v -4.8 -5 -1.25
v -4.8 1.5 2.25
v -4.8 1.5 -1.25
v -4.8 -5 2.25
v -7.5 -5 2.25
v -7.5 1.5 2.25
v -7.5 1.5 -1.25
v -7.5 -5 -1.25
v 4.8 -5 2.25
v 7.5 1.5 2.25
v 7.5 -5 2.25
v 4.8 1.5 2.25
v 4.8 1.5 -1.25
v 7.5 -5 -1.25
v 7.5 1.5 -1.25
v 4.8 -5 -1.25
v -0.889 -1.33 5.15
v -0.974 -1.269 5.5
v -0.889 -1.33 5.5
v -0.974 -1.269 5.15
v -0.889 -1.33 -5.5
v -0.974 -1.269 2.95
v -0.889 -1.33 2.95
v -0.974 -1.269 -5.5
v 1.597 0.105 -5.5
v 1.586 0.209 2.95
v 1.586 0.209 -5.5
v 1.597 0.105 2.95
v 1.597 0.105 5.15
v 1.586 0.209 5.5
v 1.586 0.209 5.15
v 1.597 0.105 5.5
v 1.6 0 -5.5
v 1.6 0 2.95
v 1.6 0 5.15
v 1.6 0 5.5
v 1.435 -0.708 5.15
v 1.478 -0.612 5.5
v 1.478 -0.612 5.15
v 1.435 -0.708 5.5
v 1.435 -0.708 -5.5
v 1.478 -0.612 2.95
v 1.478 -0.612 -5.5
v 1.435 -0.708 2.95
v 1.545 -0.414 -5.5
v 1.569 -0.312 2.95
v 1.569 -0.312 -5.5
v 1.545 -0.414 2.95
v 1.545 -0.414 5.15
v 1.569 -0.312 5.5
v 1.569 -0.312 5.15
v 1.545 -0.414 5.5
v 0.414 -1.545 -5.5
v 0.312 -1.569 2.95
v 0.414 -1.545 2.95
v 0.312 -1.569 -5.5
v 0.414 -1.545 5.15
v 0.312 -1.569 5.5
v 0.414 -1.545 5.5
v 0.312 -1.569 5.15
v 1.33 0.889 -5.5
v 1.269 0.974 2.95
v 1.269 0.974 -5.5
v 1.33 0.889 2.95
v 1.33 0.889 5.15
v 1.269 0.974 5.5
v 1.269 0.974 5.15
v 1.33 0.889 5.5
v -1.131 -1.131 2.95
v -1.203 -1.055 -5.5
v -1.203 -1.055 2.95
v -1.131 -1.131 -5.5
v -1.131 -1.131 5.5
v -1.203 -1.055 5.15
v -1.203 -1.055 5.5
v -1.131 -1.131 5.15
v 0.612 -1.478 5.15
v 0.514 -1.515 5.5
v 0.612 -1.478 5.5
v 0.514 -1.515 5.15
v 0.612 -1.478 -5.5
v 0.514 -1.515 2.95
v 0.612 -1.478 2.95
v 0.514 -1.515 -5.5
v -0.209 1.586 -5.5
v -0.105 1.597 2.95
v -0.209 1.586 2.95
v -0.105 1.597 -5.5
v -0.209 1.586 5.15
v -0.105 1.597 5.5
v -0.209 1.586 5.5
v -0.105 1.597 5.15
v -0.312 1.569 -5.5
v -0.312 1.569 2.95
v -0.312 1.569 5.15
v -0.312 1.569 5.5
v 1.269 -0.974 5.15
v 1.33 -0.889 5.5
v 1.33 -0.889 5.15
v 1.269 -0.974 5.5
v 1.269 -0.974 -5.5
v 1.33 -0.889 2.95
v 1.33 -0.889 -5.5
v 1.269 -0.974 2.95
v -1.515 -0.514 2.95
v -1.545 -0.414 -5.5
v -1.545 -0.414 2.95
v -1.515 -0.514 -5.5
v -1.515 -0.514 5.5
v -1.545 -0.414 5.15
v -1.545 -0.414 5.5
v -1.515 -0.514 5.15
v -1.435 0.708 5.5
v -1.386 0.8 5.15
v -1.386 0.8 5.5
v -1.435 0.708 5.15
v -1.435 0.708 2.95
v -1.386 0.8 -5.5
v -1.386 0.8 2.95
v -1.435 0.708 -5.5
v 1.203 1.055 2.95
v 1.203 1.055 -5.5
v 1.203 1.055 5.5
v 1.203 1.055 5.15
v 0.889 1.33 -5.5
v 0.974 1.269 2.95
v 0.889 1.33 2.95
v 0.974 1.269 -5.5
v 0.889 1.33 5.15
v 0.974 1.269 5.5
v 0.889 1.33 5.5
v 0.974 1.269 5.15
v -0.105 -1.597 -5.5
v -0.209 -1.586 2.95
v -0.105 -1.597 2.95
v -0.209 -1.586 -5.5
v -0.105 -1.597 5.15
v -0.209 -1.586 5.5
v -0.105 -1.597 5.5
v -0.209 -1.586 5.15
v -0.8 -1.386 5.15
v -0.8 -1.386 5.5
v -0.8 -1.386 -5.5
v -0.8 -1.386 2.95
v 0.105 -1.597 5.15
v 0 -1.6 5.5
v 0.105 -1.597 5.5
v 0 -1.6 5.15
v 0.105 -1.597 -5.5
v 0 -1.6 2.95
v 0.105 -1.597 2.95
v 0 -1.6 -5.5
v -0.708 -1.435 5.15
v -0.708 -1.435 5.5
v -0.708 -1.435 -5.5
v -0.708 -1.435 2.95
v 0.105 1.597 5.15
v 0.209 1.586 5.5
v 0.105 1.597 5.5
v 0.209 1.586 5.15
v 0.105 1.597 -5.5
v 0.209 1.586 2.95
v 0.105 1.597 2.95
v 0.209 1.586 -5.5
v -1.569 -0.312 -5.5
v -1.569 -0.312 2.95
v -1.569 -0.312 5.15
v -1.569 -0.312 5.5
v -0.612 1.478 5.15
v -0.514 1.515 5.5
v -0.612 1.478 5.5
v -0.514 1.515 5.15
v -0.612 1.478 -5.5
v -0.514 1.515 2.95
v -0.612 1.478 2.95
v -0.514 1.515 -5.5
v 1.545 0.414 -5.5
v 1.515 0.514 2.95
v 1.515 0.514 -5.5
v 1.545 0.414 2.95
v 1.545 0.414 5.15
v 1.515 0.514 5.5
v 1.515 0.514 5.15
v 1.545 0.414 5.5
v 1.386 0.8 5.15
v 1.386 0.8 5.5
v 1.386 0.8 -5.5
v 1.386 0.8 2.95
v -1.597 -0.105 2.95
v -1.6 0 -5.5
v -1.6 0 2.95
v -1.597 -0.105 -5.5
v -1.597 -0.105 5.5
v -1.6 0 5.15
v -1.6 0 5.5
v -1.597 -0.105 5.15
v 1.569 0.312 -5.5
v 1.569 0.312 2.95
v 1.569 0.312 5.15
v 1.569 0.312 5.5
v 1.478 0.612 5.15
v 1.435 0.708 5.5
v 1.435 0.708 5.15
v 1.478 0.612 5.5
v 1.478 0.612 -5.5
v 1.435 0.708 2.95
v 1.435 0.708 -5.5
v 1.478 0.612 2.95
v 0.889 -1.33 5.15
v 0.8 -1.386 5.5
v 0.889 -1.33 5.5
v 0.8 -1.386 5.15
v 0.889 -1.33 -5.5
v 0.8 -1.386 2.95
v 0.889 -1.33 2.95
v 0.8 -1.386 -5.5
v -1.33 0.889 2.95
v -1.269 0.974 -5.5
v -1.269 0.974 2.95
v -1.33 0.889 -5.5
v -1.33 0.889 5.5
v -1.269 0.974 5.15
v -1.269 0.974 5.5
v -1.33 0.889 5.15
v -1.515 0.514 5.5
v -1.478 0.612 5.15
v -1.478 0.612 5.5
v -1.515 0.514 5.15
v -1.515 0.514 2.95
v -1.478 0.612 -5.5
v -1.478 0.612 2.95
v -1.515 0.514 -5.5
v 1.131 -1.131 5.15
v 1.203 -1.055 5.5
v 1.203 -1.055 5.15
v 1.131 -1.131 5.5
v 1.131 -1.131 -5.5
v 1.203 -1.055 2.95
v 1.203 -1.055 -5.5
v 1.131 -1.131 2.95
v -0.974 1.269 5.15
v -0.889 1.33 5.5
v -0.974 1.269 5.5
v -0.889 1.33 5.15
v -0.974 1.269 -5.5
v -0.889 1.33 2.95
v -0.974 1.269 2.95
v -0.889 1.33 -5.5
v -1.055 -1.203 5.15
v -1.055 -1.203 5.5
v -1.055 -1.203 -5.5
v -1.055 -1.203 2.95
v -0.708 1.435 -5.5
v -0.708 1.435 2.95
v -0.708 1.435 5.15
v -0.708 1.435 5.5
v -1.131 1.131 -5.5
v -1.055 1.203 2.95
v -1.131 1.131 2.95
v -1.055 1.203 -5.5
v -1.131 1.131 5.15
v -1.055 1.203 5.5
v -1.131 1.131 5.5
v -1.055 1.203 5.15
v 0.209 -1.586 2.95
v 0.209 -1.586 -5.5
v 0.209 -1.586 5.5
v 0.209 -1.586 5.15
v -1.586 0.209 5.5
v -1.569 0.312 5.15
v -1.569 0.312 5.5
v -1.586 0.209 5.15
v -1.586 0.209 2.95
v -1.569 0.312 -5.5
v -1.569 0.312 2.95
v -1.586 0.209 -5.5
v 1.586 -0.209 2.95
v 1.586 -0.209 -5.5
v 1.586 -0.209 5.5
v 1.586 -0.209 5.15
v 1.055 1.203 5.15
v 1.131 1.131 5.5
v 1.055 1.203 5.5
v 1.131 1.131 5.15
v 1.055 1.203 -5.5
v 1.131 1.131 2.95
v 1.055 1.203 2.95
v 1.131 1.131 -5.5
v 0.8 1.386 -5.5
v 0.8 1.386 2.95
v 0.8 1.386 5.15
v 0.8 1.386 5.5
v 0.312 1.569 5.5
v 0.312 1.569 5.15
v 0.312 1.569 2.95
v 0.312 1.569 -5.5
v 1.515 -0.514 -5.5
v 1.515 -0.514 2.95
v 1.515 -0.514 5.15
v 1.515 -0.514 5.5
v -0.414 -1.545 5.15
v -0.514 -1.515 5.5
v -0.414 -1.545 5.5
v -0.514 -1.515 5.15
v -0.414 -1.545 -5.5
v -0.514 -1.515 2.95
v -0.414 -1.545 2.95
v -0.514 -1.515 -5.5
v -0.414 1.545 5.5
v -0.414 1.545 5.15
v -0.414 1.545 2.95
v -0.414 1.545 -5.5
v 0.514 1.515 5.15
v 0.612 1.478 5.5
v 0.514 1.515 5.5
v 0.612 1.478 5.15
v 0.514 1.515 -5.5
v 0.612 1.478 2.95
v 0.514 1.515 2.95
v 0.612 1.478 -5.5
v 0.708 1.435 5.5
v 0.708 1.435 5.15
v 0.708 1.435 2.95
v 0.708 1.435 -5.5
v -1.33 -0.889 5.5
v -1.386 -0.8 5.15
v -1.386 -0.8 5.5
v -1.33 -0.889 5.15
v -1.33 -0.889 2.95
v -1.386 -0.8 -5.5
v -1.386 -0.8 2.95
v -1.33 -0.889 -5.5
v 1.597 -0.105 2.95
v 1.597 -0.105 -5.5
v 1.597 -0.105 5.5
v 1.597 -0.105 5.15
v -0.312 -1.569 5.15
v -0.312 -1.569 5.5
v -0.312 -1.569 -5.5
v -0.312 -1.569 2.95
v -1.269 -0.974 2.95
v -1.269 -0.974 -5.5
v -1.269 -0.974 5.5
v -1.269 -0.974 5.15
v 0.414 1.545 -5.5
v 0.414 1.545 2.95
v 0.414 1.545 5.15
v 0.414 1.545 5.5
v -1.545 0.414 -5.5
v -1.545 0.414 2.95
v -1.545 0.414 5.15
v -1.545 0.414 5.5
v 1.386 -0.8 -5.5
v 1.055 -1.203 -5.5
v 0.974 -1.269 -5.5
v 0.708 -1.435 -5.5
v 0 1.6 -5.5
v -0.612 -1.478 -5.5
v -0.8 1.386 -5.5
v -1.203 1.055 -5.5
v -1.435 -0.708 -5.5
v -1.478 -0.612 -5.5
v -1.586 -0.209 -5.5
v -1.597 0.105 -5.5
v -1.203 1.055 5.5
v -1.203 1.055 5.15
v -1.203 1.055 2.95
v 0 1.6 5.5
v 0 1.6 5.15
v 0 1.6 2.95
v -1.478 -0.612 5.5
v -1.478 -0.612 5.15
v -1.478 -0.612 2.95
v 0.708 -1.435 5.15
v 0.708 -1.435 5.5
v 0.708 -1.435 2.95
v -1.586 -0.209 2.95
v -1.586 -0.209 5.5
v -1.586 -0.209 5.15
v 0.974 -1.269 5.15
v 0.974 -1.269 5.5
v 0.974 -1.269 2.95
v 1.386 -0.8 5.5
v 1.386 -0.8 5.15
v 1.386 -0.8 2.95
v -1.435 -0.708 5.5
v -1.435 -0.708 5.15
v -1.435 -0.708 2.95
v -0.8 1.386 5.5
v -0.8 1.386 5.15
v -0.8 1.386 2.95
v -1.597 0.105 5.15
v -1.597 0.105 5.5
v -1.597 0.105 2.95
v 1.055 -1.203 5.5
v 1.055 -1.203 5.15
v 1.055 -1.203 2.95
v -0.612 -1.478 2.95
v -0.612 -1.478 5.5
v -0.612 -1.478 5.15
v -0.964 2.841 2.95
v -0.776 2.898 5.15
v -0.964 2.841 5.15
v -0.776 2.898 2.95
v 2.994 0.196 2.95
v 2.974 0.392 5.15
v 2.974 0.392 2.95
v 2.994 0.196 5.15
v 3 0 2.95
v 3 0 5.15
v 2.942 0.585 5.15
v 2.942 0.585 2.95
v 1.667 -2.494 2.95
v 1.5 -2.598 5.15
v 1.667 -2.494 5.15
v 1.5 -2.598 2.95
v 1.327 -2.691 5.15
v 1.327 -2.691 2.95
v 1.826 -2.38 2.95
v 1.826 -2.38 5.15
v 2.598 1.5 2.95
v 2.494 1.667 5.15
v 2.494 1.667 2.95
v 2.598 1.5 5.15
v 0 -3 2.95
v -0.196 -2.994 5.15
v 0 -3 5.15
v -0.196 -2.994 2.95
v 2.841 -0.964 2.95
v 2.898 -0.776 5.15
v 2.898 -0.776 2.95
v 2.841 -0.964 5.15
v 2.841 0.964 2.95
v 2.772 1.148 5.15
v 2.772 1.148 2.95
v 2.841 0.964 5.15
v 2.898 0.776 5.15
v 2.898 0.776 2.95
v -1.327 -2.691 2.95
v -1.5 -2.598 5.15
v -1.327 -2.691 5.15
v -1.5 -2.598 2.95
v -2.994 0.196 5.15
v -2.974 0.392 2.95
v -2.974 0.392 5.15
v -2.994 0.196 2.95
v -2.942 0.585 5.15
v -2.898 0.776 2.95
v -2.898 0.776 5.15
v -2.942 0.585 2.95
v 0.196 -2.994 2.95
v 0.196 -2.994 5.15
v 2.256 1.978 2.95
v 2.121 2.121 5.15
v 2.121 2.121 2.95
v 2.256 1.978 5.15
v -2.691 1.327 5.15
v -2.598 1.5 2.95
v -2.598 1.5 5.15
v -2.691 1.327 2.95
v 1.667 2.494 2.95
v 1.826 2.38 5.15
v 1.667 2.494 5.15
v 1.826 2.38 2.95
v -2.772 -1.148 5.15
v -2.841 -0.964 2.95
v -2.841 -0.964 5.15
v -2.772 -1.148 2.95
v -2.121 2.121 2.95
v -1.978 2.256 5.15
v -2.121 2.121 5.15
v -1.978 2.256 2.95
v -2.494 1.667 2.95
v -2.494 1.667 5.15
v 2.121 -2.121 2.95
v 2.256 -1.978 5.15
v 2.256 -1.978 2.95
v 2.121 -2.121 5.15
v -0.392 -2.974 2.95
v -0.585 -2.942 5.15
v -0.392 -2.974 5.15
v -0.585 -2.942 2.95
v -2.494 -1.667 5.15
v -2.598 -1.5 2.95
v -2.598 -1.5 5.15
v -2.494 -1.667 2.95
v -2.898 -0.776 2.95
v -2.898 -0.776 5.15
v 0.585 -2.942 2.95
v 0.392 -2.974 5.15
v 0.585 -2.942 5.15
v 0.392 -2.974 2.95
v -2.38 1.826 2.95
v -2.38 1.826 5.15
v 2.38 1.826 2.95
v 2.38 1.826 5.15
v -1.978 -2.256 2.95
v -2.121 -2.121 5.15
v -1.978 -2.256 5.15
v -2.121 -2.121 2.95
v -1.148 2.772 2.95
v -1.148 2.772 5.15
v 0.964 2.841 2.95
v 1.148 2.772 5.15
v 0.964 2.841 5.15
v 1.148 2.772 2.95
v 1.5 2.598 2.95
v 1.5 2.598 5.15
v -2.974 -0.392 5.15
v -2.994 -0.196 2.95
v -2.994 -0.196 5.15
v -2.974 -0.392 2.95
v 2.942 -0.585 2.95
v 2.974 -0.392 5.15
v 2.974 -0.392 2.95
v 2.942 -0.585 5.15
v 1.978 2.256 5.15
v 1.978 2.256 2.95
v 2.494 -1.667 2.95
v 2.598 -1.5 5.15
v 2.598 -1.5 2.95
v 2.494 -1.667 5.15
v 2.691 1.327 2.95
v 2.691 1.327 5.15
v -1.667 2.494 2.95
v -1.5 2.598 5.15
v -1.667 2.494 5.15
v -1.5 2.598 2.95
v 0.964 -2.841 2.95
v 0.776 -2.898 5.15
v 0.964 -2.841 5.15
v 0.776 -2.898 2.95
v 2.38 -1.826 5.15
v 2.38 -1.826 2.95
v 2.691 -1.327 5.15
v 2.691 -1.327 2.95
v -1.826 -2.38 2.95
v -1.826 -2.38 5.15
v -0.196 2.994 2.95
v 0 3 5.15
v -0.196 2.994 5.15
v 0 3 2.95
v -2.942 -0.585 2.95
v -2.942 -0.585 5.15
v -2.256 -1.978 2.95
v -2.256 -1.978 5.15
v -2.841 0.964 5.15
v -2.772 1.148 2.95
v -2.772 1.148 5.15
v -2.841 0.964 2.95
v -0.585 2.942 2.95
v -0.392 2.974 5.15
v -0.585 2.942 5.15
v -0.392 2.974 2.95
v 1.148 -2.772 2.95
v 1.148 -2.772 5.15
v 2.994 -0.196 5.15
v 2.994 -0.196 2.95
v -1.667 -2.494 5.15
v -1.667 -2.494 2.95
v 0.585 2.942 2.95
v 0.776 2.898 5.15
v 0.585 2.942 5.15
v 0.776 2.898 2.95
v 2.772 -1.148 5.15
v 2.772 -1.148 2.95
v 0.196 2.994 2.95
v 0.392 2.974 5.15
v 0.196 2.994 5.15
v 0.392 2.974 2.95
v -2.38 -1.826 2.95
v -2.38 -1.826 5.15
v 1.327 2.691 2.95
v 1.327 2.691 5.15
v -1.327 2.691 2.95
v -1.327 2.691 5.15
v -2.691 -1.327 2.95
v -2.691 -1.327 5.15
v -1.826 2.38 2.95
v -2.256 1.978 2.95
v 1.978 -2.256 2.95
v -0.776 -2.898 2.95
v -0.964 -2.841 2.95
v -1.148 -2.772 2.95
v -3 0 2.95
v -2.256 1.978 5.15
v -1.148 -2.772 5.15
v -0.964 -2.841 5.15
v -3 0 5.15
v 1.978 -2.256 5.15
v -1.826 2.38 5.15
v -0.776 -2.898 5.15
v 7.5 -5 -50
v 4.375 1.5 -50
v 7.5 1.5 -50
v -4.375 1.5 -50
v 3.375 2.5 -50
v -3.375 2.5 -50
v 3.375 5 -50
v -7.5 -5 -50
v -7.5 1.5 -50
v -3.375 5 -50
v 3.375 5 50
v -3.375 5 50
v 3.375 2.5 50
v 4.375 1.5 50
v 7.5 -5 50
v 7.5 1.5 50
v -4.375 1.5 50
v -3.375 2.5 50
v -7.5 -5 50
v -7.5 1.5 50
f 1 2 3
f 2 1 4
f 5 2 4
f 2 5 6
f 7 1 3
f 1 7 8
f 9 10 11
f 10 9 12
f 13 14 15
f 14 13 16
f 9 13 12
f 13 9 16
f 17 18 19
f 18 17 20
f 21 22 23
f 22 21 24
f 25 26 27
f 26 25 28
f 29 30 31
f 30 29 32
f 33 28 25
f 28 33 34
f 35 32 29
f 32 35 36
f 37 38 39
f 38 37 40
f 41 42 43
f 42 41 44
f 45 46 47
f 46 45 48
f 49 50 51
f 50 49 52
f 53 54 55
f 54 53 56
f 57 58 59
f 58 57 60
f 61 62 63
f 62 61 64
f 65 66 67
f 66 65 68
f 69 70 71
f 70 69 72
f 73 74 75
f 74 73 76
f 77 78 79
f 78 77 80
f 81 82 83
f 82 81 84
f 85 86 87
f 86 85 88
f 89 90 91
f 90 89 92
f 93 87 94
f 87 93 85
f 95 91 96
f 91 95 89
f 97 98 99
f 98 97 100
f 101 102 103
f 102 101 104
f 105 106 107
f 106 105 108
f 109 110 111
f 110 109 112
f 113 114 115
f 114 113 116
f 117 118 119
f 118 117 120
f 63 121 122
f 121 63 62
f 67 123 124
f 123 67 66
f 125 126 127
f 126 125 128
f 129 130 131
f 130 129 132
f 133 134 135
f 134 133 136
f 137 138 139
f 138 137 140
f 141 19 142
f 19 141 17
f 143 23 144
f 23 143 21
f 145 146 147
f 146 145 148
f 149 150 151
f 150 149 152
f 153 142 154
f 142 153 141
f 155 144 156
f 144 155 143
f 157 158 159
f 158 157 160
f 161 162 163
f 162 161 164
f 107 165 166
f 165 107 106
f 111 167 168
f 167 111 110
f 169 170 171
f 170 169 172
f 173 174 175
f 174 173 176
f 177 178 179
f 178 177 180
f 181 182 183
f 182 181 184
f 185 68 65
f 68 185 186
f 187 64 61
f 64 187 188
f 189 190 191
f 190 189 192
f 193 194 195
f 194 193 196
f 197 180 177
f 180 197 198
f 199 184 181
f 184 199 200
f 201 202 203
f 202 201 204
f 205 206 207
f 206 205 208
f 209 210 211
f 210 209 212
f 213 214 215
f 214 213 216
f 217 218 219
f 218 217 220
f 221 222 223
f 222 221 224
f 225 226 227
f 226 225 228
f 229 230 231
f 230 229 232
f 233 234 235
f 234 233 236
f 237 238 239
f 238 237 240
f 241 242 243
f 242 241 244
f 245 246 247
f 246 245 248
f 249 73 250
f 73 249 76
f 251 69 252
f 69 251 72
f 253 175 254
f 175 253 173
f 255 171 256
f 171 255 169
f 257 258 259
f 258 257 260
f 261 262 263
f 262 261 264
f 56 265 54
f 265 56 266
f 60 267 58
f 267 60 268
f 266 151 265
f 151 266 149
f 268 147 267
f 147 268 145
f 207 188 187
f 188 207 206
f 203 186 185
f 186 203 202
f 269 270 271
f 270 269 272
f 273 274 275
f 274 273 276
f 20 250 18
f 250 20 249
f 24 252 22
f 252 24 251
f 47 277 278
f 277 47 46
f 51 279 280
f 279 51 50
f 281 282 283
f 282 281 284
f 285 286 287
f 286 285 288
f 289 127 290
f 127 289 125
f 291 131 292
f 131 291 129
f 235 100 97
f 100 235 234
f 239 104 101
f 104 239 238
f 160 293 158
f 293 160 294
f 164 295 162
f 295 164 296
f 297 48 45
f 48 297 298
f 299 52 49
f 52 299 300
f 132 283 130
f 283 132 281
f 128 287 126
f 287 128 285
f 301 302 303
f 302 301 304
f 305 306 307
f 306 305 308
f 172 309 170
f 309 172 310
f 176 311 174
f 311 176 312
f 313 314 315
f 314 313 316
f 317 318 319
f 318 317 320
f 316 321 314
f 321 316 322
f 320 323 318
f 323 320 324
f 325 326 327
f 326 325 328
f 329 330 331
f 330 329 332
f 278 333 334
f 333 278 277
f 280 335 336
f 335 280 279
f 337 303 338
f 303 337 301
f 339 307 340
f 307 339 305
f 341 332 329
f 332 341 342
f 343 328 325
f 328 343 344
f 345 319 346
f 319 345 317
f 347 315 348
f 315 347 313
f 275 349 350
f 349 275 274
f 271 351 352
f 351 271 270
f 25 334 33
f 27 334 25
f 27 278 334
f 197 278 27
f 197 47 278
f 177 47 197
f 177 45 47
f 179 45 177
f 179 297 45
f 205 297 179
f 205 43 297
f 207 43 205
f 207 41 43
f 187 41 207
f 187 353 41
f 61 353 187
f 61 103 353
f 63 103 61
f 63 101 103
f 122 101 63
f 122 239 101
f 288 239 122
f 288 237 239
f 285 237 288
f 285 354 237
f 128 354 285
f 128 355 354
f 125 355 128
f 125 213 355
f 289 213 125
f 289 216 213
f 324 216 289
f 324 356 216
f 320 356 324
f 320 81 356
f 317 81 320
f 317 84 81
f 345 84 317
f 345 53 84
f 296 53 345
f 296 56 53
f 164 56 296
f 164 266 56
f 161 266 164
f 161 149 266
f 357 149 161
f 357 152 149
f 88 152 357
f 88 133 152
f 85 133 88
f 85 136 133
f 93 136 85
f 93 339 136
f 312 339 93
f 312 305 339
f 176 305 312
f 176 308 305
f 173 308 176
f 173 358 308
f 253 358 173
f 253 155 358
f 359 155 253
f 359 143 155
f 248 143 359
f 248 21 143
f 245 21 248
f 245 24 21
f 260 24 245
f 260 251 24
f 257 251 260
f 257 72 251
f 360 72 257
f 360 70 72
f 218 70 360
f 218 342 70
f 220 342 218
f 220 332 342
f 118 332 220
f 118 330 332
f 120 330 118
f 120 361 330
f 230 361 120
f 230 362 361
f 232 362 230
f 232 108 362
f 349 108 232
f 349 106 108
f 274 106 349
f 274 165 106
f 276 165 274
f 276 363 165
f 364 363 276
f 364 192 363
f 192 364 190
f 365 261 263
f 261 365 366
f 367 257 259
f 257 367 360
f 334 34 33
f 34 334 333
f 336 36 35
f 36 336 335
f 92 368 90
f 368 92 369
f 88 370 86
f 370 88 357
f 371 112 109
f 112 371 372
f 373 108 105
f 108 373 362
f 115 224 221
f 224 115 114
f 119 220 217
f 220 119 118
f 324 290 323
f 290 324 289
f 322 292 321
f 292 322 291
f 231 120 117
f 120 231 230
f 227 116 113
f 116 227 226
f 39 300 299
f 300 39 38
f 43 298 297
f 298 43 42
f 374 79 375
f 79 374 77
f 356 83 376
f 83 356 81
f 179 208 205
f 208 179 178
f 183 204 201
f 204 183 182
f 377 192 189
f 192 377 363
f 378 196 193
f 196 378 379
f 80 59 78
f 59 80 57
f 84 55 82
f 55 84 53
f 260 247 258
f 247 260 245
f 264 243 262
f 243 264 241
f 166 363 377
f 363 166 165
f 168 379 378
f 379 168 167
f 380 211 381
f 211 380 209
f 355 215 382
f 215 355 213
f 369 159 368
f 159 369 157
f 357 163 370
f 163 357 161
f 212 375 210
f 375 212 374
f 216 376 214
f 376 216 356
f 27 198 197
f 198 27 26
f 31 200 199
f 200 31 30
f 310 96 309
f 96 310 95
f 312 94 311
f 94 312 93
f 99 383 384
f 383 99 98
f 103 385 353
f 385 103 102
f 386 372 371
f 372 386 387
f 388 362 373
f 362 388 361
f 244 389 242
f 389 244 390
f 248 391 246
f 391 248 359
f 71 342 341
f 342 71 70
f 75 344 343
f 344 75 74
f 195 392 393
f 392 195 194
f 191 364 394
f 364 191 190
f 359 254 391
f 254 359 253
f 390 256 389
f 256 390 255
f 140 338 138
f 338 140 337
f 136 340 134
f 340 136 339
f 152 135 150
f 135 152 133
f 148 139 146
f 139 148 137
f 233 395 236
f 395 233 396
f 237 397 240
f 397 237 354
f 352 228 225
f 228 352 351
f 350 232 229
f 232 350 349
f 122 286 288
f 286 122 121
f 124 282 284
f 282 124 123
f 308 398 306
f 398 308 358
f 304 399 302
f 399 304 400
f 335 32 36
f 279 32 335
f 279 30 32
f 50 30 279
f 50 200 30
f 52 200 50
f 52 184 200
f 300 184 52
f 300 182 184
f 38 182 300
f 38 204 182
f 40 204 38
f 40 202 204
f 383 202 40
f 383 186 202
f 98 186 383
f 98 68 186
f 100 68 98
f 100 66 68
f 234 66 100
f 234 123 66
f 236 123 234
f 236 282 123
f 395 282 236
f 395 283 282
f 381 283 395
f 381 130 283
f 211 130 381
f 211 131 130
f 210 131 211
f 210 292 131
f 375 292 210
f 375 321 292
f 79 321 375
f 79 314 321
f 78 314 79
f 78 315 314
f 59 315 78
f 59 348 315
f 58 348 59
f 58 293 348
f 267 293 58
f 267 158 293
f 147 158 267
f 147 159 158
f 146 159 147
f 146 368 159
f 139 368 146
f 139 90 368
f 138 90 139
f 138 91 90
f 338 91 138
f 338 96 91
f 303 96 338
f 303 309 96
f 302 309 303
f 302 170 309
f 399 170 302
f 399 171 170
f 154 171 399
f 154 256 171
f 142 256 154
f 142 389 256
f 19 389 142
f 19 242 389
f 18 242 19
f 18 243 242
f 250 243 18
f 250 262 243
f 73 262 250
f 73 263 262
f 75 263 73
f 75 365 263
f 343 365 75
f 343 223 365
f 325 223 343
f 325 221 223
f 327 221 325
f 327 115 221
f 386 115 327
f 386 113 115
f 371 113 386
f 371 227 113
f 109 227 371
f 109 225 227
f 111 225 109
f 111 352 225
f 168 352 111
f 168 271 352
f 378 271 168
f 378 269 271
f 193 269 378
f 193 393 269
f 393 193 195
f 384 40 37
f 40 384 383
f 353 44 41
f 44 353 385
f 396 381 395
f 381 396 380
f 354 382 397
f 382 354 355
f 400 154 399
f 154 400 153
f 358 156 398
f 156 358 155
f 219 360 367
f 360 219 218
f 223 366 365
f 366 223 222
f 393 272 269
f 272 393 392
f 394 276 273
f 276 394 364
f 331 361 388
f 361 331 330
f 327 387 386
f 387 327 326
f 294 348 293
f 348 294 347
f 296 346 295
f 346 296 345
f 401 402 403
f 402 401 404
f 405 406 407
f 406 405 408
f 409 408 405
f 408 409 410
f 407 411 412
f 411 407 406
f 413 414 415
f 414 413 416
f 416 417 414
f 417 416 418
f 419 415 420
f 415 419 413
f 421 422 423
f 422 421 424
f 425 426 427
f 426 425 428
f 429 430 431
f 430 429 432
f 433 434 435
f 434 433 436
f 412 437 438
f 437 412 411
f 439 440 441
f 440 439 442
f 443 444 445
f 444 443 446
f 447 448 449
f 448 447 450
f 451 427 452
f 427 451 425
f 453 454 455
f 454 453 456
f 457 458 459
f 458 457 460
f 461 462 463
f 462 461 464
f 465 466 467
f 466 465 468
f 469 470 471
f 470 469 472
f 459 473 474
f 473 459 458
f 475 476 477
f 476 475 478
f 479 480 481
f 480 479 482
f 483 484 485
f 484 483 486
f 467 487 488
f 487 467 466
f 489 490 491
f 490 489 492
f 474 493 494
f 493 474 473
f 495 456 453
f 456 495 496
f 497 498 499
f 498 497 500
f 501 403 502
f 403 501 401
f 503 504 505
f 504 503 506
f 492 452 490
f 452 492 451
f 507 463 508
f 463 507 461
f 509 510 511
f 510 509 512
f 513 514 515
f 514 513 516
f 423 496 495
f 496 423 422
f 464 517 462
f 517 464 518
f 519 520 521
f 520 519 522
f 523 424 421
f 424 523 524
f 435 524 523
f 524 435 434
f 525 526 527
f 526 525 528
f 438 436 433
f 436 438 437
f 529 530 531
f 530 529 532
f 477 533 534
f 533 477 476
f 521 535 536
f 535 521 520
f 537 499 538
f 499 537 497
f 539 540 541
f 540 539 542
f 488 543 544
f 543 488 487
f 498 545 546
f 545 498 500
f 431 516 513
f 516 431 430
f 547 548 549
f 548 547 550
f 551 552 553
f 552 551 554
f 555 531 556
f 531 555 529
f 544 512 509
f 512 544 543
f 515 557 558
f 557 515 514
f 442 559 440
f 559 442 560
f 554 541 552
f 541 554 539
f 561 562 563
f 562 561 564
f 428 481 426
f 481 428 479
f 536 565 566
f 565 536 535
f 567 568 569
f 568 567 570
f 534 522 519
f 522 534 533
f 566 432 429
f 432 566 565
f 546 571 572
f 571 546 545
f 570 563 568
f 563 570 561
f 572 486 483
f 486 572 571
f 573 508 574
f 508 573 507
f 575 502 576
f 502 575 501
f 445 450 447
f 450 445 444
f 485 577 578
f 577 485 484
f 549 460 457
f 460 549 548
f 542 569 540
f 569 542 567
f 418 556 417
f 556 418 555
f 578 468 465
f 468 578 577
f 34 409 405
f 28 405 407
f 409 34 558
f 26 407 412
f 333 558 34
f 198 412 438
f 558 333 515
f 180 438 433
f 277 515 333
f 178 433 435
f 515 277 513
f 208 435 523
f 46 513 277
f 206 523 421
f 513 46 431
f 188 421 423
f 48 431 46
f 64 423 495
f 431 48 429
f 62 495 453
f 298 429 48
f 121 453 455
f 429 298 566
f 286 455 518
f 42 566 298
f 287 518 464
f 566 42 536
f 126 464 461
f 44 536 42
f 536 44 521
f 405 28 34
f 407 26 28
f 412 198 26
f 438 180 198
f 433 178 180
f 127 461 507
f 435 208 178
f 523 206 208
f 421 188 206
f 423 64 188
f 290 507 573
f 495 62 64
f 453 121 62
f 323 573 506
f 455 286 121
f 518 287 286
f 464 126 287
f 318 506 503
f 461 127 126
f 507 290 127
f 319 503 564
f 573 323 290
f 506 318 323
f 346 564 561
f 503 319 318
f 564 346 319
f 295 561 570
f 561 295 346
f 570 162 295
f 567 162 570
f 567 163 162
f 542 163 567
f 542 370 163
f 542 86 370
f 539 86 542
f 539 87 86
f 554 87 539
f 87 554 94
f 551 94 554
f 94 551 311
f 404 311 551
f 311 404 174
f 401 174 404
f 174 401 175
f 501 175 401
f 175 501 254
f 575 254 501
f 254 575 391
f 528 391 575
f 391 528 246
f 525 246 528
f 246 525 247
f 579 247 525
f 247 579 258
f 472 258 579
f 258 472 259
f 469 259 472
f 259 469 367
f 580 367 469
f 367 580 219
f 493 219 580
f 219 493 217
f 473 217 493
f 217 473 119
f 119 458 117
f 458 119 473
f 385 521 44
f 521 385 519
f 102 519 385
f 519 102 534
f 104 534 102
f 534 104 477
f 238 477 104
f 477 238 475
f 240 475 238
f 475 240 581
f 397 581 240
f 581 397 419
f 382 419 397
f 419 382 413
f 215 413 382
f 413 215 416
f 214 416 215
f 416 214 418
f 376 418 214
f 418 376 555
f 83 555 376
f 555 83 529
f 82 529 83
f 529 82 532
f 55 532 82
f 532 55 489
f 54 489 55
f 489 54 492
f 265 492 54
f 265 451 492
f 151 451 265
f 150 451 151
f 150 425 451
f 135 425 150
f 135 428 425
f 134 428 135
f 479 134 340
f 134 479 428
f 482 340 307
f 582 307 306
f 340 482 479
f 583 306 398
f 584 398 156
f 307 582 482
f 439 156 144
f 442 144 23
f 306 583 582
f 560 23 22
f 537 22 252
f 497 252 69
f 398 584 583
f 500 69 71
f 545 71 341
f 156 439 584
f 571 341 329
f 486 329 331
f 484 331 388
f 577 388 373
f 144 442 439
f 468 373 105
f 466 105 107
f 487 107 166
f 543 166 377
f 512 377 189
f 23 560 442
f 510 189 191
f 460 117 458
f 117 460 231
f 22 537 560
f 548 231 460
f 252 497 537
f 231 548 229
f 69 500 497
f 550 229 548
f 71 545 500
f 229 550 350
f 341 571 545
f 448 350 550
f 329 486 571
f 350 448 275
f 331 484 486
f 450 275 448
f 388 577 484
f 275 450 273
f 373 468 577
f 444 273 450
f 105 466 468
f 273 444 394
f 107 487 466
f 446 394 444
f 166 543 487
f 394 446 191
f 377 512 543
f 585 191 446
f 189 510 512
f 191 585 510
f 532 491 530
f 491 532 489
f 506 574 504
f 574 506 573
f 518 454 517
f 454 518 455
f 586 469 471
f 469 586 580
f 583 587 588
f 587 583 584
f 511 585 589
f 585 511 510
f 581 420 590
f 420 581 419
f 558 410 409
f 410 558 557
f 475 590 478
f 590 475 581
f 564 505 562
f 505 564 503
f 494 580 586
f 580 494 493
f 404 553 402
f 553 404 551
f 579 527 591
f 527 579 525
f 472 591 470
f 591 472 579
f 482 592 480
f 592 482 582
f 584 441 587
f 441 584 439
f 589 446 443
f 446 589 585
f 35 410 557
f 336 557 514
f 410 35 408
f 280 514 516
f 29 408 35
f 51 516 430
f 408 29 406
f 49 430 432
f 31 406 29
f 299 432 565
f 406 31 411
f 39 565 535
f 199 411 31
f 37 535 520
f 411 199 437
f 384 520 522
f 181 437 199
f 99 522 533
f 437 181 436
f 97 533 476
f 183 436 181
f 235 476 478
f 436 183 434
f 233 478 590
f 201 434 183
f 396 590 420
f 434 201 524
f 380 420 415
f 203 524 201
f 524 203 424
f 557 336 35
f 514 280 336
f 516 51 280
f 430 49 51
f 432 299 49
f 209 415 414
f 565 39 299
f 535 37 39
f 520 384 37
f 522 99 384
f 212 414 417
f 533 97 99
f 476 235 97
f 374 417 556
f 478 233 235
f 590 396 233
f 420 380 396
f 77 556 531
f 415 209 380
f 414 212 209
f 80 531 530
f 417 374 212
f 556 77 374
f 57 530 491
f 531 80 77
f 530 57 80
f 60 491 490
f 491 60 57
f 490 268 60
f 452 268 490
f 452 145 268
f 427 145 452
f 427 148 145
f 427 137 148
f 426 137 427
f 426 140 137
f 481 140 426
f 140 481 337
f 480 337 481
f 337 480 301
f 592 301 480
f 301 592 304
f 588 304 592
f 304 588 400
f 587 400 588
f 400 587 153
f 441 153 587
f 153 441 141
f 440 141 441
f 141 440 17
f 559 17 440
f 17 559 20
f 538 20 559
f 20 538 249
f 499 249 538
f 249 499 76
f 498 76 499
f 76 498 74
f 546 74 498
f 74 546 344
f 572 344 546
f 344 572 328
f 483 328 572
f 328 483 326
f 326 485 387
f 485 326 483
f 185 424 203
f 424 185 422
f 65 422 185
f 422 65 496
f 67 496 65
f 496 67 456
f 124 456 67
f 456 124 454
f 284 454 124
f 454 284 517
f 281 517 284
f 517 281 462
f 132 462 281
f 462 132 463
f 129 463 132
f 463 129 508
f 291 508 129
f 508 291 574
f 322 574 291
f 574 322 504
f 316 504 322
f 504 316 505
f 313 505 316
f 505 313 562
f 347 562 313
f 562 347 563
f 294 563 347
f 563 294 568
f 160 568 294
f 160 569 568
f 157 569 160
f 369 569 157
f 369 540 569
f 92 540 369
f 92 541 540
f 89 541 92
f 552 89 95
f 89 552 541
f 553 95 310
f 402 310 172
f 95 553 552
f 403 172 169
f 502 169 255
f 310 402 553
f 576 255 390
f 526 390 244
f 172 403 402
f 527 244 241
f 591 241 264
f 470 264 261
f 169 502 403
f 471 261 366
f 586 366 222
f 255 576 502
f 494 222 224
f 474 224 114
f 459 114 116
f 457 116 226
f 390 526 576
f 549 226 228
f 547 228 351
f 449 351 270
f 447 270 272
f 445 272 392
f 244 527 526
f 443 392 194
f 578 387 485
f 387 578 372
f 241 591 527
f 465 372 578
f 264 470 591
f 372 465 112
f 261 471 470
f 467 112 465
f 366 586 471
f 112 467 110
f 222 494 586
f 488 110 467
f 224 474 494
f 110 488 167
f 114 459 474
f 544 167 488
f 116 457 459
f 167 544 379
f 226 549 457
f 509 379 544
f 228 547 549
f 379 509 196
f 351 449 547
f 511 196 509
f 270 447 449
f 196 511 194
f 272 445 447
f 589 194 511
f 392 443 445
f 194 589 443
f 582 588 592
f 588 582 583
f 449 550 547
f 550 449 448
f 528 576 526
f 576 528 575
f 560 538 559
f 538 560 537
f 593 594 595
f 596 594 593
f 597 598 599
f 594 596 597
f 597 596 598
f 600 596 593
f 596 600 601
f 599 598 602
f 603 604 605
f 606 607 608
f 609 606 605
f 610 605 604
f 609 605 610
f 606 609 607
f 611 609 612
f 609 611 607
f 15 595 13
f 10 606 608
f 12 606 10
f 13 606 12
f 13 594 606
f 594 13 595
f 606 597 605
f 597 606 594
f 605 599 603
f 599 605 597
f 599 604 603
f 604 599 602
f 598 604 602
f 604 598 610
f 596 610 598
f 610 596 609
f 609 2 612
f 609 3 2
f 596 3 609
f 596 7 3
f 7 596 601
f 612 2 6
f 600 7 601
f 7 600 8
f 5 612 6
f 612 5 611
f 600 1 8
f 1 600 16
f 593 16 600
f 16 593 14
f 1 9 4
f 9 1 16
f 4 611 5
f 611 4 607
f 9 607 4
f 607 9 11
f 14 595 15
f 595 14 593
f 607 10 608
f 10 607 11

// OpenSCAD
// Miniature linear guide rail (single connected solid)
// Overall dimensions: 15mm wide (X), 10mm tall (Z), 100mm long (Y)

$fn = 96;

// Parameters
rail_length = 100.0; //[50.0:200.0:1]
rail_width  = 15.0;  //[7.5:30.0:0.5]
rail_height = 10.0;  //[5.0:20.0:0.5]

// Feature parameters (kept proportional and within bounds)
edge_chamfer  = min(1.0, rail_width/10, rail_height/10);
top_land_w    = rail_width * 0.45;
top_land_h    = rail_height * 0.25;
side_groove_w = rail_width * 0.18;
side_groove_h = rail_height * 0.35;
side_groove_z = rail_height * 0.55;

// Mounting holes (through from top, with counterbore)
hole_d      = min(3.2, rail_width*0.22);
cbore_d     = min(6.0, rail_width*0.40);
cbore_depth = min(2.0, rail_height*0.22);
end_margin  = max(10.0, rail_length*0.10);
hole_count  = 5;

// Helpers
function clamp(v, lo, hi) = v < lo ? lo : (v > hi ? hi : v);

module rail_profile_2d() {
    // 2D cross-section in X-Z plane, extruded along Y
    w = rail_width;
    h = rail_height;

    tlw = clamp(top_land_w, w*0.25, w*0.70);
    tlh = clamp(top_land_h, h*0.15, h*0.40);
    ch  = clamp(edge_chamfer, 0.4, min(w, h)/4);

    // Centered on X=0, Z=0; bottom at -h/2, top at +h/2
    polygon(points=[
        [-w/2,        -h/2],
        [ w/2,        -h/2],
        [ w/2,         h/2 - tlh - ch],
        [ tlw/2 + ch,  h/2 - tlh - ch],
        [ tlw/2,       h/2 - tlh],
        [ tlw/2,       h/2],
        [-tlw/2,       h/2],
        [-tlw/2,       h/2 - tlh],
        [-tlw/2 - ch,  h/2 - tlh - ch],
        [-w/2,         h/2 - tlh - ch]
    ]);
}

module rail_solid() {
    // Extrude profile along Y to create the rail body
    linear_extrude(height=rail_length, center=true, convexity=10)
        rail_profile_2d();
}

module side_grooves_cut() {
    // Two shallow side grooves along the full length
    w = rail_width;
    h = rail_height;

    gw = clamp(side_groove_w, w*0.10, w*0.25);
    gh = clamp(side_groove_h, h*0.20, h*0.45);
    gz = clamp(side_groove_z, h*0.35, h*0.70);

    zc = -h/2 + gz;

    // Ensure cutters intersect the rail (slight overlap into body)
    overlap = 0.2;
    for (sx = [-1, 1]) {
        translate([sx*(w/2 - gw/2 + overlap/2), 0, zc])
            cube([gw + overlap, rail_length + 0.6, gh], center=true);
    }
}

module mounting_holes_cut() {
    // Through holes along Y, drilled along Z, with counterbore from top
    h = rail_height;

    usable = rail_length - 2*end_margin;
    step = (hole_count > 1) ? (usable/(hole_count-1)) : 0;

    for (i = [0:hole_count-1]) {
        y = -rail_length/2 + end_margin + i*step;

        // Through hole (guaranteed to cut through)
        translate([0, y, 0])
            cylinder(d=hole_d, h=h + 1.0, center=true);

        // Counterbore: top aligned slightly above top surface
        translate([0, y, h/2 - cbore_depth/2 + 0.05])
            cylinder(d=cbore_d, h=cbore_depth + 0.2, center=true);
    }
}

module rail_model() {
    // One connected solid: base rail with subtracted grooves and holes
    difference() {
        rail_solid();
        side_grooves_cut();
        mounting_holes_cut();
    }
}

// Place model so it is clearly visible and centered in the viewport
// (Geometry remains exactly 15 x 100 x 10 overall)
rail_model();
